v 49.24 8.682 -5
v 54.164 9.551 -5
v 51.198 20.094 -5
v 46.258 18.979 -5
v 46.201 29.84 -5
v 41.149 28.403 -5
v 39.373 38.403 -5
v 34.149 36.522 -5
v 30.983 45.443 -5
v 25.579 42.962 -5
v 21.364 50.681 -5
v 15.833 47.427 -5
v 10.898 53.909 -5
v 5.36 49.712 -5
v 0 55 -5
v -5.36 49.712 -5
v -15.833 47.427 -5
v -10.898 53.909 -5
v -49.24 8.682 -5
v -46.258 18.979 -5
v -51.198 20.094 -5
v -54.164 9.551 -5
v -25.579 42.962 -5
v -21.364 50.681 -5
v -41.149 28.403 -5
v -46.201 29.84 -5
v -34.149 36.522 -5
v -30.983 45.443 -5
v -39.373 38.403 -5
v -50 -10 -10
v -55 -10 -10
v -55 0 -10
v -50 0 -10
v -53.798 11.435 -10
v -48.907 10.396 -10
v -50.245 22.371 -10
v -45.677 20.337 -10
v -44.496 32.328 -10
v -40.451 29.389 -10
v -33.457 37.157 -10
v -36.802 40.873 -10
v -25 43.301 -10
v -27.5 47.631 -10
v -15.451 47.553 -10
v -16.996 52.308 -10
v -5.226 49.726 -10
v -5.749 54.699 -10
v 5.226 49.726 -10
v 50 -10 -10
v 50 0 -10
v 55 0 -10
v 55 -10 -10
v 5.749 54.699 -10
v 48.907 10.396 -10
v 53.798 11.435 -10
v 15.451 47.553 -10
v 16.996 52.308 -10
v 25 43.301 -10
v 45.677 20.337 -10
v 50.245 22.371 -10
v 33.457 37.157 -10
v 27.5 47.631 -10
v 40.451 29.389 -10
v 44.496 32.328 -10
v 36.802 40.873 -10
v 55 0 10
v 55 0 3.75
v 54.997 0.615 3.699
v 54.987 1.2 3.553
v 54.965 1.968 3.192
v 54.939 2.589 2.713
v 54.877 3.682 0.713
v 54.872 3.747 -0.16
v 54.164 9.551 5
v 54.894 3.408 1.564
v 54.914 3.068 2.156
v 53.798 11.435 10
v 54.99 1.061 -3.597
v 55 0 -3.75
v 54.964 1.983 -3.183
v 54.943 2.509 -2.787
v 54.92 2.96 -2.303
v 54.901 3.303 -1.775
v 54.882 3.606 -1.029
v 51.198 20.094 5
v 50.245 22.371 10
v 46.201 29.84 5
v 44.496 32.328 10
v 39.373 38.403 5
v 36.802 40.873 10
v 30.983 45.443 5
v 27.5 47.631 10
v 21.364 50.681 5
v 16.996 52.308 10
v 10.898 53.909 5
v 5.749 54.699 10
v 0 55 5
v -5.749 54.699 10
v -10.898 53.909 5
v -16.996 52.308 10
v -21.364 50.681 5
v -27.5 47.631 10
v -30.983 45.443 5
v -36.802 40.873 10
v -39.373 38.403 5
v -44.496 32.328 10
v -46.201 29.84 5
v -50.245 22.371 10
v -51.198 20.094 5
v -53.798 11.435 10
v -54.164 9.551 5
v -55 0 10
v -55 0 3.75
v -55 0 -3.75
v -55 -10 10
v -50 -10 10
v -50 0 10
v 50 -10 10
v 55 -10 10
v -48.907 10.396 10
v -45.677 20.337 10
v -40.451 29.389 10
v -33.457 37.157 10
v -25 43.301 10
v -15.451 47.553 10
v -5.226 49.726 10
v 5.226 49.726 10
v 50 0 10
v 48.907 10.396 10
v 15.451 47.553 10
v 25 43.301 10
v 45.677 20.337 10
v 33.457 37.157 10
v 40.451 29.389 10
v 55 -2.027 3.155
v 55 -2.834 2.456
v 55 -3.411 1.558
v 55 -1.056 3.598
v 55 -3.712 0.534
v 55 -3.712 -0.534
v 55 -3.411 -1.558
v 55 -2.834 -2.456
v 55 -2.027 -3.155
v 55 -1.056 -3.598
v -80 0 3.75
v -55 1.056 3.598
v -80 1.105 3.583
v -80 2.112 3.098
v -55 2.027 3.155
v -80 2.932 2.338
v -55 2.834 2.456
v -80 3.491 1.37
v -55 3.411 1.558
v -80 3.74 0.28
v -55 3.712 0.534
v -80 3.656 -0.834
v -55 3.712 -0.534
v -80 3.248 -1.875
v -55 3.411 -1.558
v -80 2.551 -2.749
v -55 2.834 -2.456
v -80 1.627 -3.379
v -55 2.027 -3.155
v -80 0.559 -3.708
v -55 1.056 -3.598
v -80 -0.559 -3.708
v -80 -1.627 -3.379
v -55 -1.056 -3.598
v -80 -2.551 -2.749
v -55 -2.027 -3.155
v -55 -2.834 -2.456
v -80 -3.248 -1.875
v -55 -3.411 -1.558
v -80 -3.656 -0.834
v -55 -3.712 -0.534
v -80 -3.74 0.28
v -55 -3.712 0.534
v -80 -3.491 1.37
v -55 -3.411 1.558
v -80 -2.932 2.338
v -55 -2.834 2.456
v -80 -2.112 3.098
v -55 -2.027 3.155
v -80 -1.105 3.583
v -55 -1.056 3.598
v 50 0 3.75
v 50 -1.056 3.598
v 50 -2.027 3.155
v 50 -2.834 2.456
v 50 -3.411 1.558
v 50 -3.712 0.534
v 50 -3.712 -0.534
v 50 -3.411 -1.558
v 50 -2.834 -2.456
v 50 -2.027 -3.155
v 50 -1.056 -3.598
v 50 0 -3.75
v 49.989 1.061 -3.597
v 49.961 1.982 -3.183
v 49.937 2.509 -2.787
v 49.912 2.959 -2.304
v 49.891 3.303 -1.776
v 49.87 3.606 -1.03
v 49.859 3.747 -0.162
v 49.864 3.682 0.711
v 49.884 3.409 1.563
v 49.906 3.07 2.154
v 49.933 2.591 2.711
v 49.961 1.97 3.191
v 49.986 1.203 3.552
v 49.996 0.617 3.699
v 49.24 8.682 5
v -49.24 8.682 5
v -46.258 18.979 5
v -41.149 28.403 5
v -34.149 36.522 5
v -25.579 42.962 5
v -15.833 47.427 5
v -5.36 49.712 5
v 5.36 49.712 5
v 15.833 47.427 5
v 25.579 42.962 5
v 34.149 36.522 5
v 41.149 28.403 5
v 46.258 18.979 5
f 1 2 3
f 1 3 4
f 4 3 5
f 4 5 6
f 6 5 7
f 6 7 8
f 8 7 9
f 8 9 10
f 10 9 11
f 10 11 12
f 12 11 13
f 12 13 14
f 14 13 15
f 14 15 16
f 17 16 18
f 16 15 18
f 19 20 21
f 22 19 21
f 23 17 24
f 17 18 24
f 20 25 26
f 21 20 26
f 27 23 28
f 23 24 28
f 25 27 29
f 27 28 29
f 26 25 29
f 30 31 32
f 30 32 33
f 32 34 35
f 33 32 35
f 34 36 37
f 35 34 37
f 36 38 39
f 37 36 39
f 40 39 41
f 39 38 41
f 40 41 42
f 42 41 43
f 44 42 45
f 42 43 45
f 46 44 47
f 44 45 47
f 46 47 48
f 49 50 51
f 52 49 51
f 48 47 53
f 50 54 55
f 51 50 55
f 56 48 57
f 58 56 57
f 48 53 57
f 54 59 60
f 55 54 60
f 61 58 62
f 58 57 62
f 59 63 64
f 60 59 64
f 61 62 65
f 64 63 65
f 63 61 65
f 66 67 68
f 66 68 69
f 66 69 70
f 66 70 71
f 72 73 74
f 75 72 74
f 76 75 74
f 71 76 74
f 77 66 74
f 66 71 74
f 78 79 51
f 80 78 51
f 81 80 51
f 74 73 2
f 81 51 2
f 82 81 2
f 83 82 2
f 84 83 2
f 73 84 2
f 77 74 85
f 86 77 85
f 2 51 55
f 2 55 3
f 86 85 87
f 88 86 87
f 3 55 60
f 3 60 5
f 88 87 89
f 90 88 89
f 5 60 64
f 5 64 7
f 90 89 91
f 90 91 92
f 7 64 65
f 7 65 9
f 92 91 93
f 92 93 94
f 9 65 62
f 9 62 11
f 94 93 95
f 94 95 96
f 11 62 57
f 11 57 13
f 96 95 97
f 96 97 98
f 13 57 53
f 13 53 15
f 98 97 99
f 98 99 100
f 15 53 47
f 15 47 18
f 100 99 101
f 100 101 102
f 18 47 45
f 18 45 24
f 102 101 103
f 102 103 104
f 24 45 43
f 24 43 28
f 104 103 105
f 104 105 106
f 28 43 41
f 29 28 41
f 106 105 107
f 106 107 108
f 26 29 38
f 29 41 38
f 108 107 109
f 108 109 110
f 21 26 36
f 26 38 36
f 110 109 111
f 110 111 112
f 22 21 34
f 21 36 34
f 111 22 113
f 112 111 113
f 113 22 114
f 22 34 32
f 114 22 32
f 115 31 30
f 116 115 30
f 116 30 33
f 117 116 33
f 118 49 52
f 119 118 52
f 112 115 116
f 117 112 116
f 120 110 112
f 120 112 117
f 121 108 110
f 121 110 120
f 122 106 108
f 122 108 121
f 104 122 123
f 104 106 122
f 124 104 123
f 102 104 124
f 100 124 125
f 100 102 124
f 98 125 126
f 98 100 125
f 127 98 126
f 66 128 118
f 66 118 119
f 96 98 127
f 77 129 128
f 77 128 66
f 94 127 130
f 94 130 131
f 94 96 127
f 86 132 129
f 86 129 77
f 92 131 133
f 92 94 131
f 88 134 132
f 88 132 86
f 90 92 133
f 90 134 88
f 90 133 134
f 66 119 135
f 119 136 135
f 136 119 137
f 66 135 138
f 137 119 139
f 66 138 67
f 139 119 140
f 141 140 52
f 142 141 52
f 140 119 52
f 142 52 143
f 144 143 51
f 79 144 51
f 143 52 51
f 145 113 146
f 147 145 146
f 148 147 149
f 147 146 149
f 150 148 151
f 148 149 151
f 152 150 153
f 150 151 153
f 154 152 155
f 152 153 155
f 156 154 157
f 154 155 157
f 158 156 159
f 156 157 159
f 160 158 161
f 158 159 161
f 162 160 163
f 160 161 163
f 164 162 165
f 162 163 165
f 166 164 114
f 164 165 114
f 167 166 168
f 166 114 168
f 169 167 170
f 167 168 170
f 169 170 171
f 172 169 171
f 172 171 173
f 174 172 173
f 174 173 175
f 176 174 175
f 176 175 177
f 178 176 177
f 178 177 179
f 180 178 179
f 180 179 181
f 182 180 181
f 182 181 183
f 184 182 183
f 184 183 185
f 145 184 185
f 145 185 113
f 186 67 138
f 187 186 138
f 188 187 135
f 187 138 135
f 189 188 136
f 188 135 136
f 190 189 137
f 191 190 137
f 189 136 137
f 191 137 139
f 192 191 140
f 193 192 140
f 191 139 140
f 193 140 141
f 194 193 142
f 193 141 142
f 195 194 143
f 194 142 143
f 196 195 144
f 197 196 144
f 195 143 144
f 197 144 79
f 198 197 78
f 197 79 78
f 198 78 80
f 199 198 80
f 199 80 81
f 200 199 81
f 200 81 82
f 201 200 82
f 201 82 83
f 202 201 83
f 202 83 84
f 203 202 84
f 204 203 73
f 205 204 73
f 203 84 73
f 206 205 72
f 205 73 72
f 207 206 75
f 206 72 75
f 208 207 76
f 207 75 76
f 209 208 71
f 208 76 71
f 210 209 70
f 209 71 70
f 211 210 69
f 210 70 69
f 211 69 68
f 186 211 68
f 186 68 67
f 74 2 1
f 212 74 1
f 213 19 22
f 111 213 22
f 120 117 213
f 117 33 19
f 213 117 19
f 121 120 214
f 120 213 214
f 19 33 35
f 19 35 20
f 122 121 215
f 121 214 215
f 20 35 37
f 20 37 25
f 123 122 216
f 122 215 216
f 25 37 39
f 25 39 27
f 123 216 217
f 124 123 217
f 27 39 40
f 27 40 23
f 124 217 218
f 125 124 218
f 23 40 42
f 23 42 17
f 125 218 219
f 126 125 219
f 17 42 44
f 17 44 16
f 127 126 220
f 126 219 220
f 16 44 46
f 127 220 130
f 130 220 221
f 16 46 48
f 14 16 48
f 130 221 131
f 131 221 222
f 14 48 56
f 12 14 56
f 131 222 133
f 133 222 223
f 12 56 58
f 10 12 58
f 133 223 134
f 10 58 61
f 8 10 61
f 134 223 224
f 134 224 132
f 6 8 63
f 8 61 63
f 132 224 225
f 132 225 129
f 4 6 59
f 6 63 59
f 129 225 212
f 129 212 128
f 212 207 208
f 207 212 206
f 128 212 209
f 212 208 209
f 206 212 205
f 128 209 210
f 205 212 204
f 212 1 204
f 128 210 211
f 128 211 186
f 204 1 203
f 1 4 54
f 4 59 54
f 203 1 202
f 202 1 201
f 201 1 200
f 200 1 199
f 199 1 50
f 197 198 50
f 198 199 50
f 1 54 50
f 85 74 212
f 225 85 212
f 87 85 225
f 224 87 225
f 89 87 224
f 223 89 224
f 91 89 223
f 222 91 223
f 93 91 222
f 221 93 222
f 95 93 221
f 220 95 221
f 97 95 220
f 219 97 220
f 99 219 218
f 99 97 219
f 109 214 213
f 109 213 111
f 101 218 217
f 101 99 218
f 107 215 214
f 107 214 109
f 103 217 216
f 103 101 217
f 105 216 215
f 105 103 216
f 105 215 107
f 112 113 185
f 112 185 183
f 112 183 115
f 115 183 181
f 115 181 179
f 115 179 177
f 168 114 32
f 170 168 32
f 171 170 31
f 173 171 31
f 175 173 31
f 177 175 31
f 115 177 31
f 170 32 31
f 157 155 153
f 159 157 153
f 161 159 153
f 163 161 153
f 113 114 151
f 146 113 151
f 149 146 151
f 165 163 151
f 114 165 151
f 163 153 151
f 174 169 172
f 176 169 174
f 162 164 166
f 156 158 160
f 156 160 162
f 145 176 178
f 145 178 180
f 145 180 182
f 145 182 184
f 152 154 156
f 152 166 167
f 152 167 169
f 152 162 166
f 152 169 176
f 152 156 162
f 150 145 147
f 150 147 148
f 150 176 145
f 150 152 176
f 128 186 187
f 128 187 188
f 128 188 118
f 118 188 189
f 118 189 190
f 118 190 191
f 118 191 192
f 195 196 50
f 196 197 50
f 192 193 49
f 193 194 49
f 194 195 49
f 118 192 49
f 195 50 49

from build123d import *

# Parameters (mm, degrees)
BOSS_EXTRUDE1_DEPTH      = 10
BOSS_EXTRUDE1_DEPTH_BACK = 10
CUT_EXTRUDE1_DEPTH       = 5
CUT_EXTRUDE1_DEPTH_BACK  = 5
SKETCH4_R                = 3.75
BOSS_EXTRUDE2_DEPTH      = 25
SKETCH5_R                = 3.75
CUT_EXTRUDE3_DEPTH       = 25


with BuildPart() as part:
    # Sketch1 → Boss-Extrude1 (new, two sides: drawn at the far end of the back side and taken through both)
    with BuildSketch(Plane.XY.offset(-BOSS_EXTRUDE1_DEPTH_BACK)):
        with BuildLine():
            Line((-55, -10), (-50, -10))
            Line((-50, -10), (-50, 0))
            ThreePointArc((-50, 0), (0, 50), (50, 0))
            Line((50, 0), (50, -10))
            Line((50, -10), (55, -10))
            Line((55, -10), (55, 0))
            ThreePointArc((55, 0), (0, 55), (-55, 0))
            Line((-55, 0), (-55, -10))
        make_face()
    extrude(amount=BOSS_EXTRUDE1_DEPTH + BOSS_EXTRUDE1_DEPTH_BACK)

    # Sketch2 → Cut-Extrude1 (cut, two sides: drawn at the far end of the back side and taken through both)
    with BuildSketch(Plane.XY.offset(-CUT_EXTRUDE1_DEPTH_BACK)):
        with BuildLine():
            Line((0, 0), (-54.164426416, 9.550649772))
            ThreePointArc((-54.164426416, 9.550649772), (0, 55), (54.164426416, 9.550649772))
            Line((54.164426416, 9.550649772), (0, 0))
        make_face()
    extrude(amount=CUT_EXTRUDE1_DEPTH + CUT_EXTRUDE1_DEPTH_BACK, mode=Mode.SUBTRACT)

    # Sketch4 → Boss-Extrude2 (add)
    with BuildSketch(Plane.ZY.offset(55)):
        Circle(SKETCH4_R)
    extrude(amount=BOSS_EXTRUDE2_DEPTH)

    # Sketch5 → Cut-Extrude3 (cut)
    with BuildSketch(Plane(origin=(55, 0, 0), x_dir=(0, 0, -1), z_dir=(1, 0, 0))):
        Circle(SKETCH5_R)
    extrude(amount=-CUT_EXTRUDE3_DEPTH, mode=Mode.SUBTRACT)


solid = part.part
